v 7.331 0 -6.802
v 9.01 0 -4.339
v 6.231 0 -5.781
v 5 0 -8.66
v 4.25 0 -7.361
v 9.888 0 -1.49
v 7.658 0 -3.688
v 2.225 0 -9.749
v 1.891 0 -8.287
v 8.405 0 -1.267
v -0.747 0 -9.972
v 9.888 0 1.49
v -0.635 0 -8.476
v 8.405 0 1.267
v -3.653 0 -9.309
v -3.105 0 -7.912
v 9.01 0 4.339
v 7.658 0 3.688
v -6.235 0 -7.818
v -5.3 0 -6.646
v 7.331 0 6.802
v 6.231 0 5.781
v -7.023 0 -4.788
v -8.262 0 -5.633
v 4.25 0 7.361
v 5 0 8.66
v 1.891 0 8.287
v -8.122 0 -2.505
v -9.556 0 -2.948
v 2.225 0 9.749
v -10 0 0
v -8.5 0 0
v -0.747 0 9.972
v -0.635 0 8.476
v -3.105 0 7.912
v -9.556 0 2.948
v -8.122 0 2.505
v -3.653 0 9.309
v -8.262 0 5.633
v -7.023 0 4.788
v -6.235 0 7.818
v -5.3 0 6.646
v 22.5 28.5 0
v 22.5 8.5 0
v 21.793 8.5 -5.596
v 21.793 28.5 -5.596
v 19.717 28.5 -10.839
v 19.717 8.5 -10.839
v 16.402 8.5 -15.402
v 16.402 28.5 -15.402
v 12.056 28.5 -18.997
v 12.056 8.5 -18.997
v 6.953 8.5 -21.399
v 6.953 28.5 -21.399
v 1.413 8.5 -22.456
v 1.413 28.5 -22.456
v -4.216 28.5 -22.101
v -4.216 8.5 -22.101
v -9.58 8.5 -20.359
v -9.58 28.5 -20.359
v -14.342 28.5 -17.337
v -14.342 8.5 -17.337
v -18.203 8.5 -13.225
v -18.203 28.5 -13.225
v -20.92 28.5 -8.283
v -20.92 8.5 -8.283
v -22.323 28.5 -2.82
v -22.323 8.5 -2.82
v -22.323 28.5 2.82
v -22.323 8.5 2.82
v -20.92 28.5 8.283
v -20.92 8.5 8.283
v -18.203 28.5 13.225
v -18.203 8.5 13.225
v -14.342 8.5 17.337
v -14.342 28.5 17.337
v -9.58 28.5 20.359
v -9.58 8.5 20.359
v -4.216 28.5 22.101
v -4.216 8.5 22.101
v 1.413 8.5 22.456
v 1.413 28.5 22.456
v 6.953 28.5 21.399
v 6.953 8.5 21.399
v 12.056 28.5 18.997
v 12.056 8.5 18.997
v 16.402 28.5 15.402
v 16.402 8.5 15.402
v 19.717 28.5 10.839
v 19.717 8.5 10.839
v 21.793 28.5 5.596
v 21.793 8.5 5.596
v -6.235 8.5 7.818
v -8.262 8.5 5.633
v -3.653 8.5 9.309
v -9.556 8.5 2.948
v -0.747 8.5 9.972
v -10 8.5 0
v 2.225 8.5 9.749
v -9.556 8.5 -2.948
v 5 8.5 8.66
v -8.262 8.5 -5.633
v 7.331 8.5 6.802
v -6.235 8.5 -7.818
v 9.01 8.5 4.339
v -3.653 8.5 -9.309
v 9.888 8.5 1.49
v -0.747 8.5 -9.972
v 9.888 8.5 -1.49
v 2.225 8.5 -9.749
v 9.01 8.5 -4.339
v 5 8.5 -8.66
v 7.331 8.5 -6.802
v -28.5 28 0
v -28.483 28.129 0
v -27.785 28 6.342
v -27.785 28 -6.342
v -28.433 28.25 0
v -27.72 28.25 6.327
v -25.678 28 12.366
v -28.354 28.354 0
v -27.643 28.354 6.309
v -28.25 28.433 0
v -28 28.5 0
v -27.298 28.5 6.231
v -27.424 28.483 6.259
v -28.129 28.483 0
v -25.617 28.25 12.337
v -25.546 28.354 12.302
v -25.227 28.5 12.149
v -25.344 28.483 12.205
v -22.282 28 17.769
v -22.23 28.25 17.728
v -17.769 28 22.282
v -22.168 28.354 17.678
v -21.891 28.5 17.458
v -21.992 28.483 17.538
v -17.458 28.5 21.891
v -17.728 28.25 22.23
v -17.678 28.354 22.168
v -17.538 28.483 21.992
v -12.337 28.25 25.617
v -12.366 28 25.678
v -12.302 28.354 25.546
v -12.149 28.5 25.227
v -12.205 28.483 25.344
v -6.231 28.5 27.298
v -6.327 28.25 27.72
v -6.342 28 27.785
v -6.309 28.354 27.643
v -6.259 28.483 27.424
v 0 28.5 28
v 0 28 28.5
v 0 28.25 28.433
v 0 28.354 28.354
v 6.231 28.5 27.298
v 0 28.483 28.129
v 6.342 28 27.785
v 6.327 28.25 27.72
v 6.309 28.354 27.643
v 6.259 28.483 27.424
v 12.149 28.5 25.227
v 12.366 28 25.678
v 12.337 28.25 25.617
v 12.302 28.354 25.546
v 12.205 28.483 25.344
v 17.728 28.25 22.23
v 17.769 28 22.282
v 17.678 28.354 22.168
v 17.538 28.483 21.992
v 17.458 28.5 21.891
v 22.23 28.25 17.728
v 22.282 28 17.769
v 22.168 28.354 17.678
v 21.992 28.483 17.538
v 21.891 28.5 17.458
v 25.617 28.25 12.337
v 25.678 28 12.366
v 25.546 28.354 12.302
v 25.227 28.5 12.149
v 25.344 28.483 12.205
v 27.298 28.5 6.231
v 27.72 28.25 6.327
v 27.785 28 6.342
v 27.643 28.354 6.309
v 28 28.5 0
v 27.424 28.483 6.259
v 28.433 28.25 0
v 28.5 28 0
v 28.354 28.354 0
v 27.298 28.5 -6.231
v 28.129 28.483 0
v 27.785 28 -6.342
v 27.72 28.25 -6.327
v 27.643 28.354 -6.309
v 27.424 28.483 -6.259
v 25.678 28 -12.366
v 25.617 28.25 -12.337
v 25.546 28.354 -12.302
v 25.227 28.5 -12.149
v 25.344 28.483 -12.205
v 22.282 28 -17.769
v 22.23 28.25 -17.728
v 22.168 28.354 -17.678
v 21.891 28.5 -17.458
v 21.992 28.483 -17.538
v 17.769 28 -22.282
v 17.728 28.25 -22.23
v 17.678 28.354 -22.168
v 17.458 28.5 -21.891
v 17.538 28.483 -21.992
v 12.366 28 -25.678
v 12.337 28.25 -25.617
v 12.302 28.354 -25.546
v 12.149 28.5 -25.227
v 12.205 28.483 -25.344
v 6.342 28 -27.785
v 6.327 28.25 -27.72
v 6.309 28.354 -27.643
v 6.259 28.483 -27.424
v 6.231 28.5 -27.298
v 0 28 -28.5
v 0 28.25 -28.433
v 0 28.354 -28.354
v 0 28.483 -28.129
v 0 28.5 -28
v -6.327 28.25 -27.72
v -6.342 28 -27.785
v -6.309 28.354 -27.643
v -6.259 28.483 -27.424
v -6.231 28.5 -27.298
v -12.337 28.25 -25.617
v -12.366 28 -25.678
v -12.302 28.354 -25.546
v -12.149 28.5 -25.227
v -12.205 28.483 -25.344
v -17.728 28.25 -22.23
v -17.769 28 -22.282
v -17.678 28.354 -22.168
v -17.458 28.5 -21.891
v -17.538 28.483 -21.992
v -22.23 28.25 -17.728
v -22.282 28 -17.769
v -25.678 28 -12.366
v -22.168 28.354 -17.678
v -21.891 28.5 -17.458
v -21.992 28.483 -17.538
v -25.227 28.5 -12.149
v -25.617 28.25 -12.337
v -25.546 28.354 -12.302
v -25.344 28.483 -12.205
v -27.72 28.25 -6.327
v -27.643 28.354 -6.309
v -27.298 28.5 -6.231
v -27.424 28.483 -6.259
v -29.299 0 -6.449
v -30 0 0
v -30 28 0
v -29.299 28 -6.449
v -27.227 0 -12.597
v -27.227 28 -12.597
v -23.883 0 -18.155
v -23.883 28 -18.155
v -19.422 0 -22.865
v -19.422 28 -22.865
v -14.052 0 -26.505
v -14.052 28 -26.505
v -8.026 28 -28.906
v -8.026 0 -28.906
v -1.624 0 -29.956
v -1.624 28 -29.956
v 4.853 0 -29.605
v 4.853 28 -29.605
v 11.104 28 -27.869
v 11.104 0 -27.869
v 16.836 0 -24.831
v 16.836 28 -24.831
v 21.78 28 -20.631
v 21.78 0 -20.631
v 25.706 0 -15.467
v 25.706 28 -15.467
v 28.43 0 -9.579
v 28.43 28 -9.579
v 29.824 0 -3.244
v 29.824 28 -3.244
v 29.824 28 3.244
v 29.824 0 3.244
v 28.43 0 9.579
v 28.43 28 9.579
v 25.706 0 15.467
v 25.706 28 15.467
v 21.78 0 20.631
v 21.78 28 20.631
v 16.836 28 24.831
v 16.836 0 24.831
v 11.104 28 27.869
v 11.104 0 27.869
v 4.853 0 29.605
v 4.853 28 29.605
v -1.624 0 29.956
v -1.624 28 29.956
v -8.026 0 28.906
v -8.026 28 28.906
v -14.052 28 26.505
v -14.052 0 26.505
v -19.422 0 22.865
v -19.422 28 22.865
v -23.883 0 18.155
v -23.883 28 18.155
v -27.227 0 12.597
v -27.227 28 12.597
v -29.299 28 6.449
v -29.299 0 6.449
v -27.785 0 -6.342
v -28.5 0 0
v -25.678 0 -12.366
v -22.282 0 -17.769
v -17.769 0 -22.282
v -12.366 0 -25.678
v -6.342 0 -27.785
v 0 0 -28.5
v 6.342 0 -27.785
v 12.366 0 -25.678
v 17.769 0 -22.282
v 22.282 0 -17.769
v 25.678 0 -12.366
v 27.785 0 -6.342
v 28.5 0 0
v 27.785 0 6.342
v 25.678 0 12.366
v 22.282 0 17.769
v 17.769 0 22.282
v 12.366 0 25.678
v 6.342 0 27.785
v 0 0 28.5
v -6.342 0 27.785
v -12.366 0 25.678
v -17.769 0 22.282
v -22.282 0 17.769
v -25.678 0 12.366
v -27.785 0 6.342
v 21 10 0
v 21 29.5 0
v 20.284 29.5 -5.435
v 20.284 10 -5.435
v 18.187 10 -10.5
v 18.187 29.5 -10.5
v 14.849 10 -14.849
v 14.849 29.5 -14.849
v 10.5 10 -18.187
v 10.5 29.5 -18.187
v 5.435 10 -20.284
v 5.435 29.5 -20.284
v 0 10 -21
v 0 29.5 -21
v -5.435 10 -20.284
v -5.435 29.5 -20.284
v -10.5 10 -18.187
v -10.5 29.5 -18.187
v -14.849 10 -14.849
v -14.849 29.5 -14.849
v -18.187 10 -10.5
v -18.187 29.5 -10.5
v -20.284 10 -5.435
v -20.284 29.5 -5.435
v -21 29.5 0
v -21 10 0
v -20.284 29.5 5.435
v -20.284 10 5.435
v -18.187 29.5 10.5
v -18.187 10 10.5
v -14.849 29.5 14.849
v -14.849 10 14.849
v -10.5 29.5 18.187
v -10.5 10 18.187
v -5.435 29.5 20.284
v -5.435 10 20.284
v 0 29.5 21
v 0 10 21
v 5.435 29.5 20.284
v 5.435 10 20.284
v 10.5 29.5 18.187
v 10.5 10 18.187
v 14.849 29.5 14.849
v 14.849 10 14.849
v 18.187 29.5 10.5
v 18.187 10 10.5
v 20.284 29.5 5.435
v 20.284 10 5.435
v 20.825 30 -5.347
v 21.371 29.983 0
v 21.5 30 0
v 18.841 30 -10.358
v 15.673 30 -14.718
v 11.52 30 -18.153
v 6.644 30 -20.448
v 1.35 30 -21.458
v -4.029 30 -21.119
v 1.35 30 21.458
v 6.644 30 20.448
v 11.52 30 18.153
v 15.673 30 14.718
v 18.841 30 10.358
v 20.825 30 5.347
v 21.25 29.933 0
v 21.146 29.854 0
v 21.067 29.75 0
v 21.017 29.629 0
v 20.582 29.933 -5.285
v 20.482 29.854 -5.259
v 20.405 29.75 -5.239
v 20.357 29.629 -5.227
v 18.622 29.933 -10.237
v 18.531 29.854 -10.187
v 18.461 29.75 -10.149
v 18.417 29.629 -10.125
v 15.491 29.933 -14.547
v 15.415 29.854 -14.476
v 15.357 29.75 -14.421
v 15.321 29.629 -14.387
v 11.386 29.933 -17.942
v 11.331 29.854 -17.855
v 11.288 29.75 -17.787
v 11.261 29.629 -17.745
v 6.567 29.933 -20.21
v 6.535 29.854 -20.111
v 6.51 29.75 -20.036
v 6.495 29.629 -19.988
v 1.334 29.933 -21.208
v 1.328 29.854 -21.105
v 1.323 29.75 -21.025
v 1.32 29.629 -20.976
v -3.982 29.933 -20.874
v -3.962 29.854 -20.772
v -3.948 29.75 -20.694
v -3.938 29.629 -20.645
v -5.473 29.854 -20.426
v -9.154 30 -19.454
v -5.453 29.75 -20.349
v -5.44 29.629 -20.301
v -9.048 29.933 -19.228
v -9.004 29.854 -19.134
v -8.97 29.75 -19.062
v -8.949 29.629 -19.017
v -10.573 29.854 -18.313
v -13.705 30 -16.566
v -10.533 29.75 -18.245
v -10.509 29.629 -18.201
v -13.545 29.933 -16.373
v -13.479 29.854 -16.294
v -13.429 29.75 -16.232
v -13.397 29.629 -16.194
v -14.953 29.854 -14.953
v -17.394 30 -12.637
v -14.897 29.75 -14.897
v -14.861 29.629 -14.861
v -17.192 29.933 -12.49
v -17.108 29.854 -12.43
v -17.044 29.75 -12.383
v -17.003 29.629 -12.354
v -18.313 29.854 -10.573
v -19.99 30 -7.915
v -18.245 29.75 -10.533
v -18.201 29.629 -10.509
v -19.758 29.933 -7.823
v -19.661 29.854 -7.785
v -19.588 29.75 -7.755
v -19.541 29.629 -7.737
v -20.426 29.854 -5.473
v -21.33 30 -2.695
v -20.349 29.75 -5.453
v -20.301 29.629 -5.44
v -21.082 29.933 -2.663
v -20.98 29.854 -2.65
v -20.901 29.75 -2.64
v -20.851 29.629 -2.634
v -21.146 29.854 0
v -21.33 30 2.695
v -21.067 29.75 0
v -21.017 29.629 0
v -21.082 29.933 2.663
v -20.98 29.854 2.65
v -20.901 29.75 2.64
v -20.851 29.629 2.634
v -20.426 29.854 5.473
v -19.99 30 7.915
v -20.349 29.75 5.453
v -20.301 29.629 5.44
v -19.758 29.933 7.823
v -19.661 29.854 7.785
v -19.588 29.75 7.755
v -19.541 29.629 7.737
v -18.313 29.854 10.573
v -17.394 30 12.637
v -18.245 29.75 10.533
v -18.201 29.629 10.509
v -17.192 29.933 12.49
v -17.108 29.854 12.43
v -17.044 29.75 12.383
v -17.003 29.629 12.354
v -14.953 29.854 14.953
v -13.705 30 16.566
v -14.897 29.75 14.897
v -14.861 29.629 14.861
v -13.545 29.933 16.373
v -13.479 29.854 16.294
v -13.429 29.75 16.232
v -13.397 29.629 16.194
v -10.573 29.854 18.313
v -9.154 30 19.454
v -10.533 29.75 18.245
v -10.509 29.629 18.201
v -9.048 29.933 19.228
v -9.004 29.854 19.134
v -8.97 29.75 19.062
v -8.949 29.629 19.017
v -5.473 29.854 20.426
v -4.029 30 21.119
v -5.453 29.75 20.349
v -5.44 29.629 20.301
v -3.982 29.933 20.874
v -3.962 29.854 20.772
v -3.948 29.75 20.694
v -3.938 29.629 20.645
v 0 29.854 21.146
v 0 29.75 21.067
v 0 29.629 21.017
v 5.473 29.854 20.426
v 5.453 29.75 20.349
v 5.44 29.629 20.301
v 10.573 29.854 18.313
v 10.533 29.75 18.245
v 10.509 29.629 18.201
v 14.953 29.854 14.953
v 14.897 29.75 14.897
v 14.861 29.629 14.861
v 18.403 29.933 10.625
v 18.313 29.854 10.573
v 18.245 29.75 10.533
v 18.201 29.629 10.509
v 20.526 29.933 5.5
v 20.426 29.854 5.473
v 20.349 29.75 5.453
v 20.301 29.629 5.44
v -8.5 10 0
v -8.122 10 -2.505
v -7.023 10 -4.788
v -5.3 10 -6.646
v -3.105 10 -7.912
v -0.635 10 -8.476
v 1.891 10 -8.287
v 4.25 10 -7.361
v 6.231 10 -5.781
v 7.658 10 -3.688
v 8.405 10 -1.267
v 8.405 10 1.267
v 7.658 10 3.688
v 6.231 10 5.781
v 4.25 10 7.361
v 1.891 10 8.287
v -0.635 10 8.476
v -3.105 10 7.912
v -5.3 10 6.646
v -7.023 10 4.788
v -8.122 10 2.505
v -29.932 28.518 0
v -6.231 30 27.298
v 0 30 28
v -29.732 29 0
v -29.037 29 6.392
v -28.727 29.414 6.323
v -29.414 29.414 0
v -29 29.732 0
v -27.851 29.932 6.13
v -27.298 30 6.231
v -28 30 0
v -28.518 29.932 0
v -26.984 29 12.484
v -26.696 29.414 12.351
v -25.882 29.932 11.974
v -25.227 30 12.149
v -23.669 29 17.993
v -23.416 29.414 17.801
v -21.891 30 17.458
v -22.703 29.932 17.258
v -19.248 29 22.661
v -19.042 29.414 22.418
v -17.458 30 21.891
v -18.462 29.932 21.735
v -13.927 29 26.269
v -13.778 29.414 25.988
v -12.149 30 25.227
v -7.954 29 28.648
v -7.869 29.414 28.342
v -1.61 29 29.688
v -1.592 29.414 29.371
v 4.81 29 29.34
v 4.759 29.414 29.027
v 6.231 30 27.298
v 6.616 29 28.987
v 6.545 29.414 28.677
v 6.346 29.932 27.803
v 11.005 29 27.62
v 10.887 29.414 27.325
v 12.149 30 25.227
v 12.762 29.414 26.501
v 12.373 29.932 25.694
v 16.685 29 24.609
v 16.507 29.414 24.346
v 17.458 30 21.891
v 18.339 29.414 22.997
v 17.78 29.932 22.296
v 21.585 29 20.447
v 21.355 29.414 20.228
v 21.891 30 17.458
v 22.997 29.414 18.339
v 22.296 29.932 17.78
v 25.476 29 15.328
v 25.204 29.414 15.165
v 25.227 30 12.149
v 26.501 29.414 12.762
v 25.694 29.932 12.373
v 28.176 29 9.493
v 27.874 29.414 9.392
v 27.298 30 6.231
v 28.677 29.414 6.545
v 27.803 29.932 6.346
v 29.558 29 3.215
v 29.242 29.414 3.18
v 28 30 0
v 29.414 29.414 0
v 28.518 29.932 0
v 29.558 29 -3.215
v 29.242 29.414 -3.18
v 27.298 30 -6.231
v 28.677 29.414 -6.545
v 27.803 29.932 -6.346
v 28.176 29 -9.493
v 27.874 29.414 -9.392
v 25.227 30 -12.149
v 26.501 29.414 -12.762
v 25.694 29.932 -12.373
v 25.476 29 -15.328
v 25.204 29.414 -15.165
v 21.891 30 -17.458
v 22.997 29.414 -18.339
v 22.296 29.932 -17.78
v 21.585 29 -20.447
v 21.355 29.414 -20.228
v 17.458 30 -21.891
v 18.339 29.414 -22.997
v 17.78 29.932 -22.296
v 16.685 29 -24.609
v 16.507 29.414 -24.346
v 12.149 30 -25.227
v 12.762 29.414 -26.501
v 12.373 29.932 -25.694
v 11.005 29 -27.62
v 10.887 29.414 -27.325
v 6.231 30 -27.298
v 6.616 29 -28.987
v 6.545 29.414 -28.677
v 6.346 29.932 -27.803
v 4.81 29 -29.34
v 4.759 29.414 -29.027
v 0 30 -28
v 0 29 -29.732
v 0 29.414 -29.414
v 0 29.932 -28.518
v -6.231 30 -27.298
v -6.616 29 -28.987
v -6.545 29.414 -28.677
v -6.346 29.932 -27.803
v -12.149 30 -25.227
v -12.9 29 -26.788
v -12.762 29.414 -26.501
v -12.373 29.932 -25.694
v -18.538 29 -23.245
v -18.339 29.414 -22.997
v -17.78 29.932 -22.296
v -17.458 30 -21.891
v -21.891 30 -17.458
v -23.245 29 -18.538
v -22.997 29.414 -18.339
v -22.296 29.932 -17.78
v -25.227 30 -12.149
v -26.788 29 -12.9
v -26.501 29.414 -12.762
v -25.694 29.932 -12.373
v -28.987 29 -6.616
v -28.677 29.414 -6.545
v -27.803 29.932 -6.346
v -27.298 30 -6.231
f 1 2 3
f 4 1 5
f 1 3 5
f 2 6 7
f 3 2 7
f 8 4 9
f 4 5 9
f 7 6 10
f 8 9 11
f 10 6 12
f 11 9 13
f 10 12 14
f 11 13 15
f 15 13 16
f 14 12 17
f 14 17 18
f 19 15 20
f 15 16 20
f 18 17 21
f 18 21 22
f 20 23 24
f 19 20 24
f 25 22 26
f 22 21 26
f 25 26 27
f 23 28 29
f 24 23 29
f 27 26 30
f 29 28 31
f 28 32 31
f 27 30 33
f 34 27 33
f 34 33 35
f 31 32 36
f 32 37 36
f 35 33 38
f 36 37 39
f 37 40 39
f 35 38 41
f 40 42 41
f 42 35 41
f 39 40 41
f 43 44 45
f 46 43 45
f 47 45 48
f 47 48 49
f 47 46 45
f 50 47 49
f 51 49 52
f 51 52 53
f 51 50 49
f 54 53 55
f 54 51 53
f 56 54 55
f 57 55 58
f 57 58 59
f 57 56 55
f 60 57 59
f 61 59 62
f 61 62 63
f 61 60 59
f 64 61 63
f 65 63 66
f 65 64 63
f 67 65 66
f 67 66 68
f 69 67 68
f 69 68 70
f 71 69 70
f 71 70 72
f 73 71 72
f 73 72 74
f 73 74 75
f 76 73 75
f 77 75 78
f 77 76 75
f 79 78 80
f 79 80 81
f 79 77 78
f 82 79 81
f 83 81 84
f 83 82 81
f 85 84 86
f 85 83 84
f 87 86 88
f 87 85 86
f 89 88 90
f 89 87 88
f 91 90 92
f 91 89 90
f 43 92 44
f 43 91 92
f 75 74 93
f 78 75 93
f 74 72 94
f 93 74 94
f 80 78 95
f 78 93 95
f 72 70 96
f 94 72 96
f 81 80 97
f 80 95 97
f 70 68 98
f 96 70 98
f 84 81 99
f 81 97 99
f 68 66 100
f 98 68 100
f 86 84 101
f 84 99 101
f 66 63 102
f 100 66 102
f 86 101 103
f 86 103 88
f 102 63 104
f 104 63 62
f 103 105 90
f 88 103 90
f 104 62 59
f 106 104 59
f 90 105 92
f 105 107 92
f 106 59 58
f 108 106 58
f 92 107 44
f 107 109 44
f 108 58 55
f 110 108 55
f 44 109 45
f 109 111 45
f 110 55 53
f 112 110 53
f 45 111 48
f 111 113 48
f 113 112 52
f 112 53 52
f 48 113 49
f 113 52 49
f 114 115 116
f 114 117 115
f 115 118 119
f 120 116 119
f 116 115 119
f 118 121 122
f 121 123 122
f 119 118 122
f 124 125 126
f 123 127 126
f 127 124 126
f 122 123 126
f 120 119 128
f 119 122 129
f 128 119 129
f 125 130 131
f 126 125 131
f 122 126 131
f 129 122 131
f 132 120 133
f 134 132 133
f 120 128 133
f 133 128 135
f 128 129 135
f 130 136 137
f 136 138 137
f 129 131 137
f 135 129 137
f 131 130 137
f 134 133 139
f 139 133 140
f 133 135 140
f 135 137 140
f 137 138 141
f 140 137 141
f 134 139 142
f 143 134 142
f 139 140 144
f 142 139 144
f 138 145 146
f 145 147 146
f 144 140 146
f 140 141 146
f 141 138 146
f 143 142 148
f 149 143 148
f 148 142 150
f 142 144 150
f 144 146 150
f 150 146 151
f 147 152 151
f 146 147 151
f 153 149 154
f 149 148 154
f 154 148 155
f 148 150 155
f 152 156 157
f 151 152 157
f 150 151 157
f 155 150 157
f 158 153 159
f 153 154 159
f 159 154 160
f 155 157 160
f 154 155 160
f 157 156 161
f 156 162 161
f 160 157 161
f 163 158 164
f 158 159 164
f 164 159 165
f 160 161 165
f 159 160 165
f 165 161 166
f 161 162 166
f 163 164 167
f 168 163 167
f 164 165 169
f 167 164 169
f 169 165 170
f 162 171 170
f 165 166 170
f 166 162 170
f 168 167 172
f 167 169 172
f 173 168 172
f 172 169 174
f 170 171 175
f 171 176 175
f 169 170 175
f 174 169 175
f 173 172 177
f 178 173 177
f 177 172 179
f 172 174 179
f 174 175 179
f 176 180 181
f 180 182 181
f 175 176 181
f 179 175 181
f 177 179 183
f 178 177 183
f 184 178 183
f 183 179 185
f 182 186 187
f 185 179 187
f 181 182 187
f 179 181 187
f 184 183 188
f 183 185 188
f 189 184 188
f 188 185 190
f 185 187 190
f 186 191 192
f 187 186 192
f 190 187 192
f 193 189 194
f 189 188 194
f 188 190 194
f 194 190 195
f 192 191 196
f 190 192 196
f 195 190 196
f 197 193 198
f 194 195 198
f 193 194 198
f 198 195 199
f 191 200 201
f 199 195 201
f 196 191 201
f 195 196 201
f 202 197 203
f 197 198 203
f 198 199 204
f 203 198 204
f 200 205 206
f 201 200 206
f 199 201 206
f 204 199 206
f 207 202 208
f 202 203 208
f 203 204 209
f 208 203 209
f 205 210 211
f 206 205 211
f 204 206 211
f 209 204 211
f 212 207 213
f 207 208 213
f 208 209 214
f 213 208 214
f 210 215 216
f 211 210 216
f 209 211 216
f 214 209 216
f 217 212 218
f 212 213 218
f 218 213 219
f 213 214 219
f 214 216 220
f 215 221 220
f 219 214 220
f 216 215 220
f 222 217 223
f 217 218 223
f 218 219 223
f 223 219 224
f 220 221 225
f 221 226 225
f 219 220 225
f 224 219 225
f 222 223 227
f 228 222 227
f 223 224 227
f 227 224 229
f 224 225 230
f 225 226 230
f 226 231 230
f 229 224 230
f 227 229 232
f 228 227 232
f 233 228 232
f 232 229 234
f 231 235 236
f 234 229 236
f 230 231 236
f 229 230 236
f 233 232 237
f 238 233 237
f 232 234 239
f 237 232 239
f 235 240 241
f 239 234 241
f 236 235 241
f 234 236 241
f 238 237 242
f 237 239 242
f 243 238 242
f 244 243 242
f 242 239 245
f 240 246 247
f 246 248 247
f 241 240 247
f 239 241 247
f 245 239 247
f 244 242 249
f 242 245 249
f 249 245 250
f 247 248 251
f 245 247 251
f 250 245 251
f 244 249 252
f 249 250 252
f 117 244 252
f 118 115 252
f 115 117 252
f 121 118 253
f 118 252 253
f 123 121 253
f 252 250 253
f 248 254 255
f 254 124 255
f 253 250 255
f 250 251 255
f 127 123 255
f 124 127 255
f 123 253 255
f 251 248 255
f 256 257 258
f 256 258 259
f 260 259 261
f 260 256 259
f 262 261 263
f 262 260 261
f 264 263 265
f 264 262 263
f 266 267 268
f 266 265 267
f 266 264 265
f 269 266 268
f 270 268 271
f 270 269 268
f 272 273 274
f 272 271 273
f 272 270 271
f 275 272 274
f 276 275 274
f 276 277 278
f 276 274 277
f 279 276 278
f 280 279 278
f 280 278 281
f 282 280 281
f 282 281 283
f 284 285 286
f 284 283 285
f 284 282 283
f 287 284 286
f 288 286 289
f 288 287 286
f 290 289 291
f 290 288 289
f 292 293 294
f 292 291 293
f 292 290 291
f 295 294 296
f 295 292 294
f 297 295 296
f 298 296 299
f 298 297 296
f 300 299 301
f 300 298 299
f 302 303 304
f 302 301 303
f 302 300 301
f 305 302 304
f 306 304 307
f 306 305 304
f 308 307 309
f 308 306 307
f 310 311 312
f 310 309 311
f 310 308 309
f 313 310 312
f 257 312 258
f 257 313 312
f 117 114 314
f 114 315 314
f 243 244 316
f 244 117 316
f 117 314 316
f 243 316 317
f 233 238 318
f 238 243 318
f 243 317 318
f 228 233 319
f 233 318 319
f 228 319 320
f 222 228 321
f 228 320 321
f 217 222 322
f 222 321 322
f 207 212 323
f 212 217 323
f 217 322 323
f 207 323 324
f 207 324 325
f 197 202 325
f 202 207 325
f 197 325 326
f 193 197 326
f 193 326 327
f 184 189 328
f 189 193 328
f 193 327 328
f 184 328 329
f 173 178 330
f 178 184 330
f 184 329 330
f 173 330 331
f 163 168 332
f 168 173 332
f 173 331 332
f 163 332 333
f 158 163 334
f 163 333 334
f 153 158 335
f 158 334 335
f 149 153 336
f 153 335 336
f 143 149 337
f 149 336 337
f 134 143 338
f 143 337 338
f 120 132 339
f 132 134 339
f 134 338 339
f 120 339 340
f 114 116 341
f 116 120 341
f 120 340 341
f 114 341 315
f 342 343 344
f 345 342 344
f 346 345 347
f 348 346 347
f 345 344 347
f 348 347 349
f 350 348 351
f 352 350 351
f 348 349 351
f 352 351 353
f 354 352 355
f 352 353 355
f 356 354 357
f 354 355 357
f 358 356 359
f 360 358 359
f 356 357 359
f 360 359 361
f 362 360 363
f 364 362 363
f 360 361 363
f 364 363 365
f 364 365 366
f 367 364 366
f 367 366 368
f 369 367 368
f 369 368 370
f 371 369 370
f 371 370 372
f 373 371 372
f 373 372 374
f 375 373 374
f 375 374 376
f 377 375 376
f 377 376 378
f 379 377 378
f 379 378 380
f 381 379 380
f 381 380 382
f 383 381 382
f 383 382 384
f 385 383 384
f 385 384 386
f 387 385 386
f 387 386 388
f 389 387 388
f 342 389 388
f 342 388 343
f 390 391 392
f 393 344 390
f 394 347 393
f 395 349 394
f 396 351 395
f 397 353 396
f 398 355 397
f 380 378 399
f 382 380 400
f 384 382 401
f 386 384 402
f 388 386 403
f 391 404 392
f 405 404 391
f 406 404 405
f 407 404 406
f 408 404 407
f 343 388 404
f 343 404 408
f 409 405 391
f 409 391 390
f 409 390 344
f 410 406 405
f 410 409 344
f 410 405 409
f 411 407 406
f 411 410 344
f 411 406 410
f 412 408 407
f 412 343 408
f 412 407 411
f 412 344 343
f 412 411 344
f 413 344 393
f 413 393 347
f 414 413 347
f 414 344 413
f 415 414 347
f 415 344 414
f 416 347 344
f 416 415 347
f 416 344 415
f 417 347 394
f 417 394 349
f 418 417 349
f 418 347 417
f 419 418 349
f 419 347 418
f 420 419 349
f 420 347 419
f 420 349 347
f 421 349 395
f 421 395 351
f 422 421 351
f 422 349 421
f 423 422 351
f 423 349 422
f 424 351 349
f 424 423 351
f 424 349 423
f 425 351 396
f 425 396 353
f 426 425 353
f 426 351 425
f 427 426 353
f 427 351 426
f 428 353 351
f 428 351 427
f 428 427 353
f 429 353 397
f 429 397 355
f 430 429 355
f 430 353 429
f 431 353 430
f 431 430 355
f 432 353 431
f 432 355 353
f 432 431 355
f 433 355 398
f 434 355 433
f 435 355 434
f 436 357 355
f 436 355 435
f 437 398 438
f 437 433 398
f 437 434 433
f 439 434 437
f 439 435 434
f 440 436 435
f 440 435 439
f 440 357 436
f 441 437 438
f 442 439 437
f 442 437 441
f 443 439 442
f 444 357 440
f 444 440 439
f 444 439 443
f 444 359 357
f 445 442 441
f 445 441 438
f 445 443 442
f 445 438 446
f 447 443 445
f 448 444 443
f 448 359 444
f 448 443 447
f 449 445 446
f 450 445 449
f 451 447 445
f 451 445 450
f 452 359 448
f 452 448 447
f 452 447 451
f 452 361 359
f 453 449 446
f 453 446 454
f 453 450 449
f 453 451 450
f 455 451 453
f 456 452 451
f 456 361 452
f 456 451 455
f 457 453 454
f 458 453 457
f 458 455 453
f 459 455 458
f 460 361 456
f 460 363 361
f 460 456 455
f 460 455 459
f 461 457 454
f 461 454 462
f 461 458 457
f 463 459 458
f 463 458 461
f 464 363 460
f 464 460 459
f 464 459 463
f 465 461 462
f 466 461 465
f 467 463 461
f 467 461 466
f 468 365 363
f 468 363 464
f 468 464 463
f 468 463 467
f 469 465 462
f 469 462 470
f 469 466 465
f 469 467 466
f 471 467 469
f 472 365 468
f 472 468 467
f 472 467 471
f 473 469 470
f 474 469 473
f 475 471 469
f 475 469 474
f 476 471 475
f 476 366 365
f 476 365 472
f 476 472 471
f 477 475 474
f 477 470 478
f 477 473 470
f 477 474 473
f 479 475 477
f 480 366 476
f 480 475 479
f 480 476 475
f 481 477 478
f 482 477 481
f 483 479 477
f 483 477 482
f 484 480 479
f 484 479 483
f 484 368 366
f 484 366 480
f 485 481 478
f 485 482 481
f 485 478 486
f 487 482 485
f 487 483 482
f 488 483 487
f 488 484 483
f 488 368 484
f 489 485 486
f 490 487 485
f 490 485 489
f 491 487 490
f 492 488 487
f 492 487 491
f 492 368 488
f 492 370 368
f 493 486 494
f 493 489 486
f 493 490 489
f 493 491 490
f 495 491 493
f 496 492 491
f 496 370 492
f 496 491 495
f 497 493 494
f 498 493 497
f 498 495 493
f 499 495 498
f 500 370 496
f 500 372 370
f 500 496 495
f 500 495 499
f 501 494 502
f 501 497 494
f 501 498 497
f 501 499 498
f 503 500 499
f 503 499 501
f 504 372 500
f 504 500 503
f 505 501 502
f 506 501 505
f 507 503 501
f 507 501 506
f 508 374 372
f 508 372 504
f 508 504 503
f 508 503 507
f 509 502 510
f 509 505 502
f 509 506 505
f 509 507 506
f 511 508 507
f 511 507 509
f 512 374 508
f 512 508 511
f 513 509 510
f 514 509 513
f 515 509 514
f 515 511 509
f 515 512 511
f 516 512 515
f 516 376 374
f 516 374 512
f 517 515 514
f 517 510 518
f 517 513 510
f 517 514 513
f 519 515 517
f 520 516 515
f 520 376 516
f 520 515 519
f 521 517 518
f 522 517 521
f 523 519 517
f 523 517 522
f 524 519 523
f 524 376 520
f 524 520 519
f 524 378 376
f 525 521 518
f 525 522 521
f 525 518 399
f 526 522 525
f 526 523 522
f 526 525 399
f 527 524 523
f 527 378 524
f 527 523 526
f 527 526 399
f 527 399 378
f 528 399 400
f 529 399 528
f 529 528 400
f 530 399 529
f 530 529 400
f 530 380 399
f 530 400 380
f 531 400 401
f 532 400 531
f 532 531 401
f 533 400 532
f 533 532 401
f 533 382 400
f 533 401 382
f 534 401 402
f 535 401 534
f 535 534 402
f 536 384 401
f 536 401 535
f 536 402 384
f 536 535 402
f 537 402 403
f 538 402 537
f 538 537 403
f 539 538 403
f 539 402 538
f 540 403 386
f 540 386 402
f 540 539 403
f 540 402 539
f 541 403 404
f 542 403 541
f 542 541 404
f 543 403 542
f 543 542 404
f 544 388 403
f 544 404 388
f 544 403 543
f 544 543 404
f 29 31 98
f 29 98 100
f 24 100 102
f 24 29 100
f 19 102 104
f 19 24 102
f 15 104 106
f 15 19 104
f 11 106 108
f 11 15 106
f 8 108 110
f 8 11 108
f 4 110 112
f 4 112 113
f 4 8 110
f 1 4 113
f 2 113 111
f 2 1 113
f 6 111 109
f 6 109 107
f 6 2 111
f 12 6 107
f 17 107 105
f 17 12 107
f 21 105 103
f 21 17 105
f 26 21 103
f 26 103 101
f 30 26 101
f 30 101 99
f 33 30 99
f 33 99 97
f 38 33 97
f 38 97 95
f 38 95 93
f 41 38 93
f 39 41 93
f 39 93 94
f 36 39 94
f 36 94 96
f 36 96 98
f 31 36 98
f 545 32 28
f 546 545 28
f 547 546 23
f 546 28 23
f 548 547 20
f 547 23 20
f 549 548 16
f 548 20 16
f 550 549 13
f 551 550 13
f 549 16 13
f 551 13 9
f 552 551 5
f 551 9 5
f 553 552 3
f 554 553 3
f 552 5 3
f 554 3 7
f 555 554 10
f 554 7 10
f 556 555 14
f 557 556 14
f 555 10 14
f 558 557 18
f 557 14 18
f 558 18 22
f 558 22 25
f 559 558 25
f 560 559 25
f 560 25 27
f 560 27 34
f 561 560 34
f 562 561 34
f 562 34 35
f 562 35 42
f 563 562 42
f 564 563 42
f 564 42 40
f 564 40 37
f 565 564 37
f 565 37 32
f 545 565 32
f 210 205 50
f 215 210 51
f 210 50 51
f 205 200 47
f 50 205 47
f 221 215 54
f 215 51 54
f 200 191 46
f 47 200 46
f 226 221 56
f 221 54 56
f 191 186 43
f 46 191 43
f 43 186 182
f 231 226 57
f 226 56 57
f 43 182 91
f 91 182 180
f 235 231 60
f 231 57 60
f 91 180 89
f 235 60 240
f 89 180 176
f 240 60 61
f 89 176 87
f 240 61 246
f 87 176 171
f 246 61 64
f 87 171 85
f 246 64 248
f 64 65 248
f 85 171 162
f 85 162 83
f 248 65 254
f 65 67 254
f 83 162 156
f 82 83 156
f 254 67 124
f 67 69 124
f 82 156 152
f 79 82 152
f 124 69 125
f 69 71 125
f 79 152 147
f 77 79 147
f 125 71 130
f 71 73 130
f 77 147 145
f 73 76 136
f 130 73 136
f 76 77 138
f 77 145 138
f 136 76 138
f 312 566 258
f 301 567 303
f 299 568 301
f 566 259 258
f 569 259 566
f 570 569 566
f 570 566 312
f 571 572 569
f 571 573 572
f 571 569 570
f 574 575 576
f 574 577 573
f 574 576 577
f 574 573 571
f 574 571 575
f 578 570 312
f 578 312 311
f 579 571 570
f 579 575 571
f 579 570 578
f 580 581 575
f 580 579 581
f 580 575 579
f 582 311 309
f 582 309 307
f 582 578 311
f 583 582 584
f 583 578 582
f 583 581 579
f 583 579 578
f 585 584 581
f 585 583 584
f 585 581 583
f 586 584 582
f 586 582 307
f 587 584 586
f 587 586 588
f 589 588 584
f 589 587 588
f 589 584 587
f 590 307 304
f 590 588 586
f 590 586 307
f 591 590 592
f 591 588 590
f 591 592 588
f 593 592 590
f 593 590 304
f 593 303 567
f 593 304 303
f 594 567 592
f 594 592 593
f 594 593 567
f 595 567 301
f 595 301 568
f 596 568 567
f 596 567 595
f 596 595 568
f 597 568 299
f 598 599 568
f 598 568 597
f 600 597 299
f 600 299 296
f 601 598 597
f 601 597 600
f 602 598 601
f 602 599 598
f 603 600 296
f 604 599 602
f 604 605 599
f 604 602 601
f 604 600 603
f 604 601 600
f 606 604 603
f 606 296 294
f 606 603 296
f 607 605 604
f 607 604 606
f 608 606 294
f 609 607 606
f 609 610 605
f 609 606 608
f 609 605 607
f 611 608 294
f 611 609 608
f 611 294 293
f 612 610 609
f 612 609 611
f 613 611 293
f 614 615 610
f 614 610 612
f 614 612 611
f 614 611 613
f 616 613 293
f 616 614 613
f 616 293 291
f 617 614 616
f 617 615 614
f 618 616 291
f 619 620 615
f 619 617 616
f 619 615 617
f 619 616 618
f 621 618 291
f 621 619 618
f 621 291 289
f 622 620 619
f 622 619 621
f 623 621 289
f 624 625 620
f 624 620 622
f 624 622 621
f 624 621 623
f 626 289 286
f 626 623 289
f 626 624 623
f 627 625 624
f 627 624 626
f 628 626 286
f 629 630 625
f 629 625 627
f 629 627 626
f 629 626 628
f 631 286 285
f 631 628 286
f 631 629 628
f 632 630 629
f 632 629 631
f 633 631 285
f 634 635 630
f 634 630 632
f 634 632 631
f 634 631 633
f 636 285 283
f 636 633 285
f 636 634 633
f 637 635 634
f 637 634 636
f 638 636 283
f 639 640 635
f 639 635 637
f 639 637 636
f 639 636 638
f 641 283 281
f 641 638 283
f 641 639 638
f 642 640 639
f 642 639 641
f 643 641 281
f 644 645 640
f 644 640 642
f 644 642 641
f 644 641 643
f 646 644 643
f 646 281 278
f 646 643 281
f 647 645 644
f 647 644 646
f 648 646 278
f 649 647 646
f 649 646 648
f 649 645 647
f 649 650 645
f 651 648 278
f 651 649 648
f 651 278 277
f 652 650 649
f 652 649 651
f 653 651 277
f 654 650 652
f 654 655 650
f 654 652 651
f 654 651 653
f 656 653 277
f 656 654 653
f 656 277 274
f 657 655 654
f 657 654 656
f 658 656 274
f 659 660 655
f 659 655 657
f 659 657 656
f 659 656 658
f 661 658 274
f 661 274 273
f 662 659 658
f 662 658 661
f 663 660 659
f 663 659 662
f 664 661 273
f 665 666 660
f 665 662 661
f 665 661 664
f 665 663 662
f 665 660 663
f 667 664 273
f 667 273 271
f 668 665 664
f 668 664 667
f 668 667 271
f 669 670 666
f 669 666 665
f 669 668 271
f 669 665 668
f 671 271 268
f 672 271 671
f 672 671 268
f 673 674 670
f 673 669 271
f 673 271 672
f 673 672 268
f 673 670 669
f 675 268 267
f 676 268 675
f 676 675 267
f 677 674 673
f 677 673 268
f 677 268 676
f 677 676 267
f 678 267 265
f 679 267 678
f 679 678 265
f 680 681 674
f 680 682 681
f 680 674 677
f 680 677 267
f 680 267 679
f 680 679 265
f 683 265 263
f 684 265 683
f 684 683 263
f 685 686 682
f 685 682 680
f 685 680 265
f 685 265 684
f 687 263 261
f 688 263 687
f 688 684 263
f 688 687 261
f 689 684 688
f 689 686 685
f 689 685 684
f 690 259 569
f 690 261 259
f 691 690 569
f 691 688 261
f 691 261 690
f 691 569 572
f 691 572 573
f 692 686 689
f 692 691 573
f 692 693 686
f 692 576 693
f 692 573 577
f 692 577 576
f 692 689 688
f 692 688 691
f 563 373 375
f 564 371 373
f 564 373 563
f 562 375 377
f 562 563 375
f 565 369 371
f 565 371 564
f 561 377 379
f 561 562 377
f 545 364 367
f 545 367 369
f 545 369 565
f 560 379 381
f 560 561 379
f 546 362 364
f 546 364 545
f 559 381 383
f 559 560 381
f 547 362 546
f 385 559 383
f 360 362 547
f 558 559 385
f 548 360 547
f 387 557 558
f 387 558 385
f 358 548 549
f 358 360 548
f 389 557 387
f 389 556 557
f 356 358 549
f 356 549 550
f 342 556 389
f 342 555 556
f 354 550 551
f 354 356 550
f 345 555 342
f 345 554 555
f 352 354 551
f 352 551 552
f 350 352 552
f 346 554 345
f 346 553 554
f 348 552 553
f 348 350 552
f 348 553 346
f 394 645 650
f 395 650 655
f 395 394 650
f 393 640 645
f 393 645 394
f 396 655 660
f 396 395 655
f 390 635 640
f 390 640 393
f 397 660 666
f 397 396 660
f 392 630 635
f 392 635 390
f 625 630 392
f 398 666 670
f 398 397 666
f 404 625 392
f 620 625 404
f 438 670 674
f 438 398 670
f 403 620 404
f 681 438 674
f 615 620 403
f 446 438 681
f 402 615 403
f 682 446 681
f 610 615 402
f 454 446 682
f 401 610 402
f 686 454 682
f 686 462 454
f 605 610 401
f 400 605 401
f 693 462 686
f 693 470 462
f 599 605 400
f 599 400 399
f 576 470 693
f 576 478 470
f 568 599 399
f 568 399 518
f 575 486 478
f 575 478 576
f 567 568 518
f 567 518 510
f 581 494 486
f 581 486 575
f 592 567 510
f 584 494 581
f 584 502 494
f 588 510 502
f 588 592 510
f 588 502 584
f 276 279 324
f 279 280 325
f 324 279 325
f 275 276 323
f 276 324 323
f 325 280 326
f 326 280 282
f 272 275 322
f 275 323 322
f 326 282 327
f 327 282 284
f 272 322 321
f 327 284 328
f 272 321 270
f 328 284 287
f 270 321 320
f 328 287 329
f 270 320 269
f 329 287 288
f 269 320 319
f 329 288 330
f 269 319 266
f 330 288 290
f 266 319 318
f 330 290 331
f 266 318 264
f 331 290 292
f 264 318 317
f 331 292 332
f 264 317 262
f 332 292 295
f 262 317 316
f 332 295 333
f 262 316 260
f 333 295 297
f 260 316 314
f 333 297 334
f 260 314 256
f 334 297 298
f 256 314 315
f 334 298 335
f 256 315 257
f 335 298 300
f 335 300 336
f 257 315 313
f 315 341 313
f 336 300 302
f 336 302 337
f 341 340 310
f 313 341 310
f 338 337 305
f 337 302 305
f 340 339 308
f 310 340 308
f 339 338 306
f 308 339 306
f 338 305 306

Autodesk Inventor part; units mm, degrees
ref_plane "YZ Plane" through (0, 0, 0) normal (1, 0, 0) x (0, 1, 0)
ref_plane "XZ Plane" through (0, 0, 0) normal (0, 1, 0) x (-1, 0, 0)
ref_plane "XY Plane" through (0, 0, 0) normal (0, 0, 1) x (1, 0, 0)
sketch "Sketch1" plane through (0, 0, 0) normal (0, 1, 0) x (-1, 0, 0)
  circle A0 centre (0, 0) radius 30
  circle A1 centre (0, 0) radius 8.5
  dimension "d0" = 60
  dimension "d1" = 17
extrude "Extrusion1" add sketch "Sketch1" along normal blind 30
sketch "Sketch2" plane through (0, 30, 0) normal (0, 1, 0) x (1, 0, 0)
  circle A0 centre (0, 0) radius 21
  dimension "d4" = 42
extrude "Extrusion2" cut sketch "Sketch2" against normal blind 20
fillet "Fillet1" radius 2 1 edges at (30, 30, 0)
fillet "Fillet2" radius 0.5 1 edges at (-21, 30, 0)
shell "Shell2" thickness 1.5 removed faces 1 at (-22.4604, 0, -3.0712)
properties part number "FrontWheel"
